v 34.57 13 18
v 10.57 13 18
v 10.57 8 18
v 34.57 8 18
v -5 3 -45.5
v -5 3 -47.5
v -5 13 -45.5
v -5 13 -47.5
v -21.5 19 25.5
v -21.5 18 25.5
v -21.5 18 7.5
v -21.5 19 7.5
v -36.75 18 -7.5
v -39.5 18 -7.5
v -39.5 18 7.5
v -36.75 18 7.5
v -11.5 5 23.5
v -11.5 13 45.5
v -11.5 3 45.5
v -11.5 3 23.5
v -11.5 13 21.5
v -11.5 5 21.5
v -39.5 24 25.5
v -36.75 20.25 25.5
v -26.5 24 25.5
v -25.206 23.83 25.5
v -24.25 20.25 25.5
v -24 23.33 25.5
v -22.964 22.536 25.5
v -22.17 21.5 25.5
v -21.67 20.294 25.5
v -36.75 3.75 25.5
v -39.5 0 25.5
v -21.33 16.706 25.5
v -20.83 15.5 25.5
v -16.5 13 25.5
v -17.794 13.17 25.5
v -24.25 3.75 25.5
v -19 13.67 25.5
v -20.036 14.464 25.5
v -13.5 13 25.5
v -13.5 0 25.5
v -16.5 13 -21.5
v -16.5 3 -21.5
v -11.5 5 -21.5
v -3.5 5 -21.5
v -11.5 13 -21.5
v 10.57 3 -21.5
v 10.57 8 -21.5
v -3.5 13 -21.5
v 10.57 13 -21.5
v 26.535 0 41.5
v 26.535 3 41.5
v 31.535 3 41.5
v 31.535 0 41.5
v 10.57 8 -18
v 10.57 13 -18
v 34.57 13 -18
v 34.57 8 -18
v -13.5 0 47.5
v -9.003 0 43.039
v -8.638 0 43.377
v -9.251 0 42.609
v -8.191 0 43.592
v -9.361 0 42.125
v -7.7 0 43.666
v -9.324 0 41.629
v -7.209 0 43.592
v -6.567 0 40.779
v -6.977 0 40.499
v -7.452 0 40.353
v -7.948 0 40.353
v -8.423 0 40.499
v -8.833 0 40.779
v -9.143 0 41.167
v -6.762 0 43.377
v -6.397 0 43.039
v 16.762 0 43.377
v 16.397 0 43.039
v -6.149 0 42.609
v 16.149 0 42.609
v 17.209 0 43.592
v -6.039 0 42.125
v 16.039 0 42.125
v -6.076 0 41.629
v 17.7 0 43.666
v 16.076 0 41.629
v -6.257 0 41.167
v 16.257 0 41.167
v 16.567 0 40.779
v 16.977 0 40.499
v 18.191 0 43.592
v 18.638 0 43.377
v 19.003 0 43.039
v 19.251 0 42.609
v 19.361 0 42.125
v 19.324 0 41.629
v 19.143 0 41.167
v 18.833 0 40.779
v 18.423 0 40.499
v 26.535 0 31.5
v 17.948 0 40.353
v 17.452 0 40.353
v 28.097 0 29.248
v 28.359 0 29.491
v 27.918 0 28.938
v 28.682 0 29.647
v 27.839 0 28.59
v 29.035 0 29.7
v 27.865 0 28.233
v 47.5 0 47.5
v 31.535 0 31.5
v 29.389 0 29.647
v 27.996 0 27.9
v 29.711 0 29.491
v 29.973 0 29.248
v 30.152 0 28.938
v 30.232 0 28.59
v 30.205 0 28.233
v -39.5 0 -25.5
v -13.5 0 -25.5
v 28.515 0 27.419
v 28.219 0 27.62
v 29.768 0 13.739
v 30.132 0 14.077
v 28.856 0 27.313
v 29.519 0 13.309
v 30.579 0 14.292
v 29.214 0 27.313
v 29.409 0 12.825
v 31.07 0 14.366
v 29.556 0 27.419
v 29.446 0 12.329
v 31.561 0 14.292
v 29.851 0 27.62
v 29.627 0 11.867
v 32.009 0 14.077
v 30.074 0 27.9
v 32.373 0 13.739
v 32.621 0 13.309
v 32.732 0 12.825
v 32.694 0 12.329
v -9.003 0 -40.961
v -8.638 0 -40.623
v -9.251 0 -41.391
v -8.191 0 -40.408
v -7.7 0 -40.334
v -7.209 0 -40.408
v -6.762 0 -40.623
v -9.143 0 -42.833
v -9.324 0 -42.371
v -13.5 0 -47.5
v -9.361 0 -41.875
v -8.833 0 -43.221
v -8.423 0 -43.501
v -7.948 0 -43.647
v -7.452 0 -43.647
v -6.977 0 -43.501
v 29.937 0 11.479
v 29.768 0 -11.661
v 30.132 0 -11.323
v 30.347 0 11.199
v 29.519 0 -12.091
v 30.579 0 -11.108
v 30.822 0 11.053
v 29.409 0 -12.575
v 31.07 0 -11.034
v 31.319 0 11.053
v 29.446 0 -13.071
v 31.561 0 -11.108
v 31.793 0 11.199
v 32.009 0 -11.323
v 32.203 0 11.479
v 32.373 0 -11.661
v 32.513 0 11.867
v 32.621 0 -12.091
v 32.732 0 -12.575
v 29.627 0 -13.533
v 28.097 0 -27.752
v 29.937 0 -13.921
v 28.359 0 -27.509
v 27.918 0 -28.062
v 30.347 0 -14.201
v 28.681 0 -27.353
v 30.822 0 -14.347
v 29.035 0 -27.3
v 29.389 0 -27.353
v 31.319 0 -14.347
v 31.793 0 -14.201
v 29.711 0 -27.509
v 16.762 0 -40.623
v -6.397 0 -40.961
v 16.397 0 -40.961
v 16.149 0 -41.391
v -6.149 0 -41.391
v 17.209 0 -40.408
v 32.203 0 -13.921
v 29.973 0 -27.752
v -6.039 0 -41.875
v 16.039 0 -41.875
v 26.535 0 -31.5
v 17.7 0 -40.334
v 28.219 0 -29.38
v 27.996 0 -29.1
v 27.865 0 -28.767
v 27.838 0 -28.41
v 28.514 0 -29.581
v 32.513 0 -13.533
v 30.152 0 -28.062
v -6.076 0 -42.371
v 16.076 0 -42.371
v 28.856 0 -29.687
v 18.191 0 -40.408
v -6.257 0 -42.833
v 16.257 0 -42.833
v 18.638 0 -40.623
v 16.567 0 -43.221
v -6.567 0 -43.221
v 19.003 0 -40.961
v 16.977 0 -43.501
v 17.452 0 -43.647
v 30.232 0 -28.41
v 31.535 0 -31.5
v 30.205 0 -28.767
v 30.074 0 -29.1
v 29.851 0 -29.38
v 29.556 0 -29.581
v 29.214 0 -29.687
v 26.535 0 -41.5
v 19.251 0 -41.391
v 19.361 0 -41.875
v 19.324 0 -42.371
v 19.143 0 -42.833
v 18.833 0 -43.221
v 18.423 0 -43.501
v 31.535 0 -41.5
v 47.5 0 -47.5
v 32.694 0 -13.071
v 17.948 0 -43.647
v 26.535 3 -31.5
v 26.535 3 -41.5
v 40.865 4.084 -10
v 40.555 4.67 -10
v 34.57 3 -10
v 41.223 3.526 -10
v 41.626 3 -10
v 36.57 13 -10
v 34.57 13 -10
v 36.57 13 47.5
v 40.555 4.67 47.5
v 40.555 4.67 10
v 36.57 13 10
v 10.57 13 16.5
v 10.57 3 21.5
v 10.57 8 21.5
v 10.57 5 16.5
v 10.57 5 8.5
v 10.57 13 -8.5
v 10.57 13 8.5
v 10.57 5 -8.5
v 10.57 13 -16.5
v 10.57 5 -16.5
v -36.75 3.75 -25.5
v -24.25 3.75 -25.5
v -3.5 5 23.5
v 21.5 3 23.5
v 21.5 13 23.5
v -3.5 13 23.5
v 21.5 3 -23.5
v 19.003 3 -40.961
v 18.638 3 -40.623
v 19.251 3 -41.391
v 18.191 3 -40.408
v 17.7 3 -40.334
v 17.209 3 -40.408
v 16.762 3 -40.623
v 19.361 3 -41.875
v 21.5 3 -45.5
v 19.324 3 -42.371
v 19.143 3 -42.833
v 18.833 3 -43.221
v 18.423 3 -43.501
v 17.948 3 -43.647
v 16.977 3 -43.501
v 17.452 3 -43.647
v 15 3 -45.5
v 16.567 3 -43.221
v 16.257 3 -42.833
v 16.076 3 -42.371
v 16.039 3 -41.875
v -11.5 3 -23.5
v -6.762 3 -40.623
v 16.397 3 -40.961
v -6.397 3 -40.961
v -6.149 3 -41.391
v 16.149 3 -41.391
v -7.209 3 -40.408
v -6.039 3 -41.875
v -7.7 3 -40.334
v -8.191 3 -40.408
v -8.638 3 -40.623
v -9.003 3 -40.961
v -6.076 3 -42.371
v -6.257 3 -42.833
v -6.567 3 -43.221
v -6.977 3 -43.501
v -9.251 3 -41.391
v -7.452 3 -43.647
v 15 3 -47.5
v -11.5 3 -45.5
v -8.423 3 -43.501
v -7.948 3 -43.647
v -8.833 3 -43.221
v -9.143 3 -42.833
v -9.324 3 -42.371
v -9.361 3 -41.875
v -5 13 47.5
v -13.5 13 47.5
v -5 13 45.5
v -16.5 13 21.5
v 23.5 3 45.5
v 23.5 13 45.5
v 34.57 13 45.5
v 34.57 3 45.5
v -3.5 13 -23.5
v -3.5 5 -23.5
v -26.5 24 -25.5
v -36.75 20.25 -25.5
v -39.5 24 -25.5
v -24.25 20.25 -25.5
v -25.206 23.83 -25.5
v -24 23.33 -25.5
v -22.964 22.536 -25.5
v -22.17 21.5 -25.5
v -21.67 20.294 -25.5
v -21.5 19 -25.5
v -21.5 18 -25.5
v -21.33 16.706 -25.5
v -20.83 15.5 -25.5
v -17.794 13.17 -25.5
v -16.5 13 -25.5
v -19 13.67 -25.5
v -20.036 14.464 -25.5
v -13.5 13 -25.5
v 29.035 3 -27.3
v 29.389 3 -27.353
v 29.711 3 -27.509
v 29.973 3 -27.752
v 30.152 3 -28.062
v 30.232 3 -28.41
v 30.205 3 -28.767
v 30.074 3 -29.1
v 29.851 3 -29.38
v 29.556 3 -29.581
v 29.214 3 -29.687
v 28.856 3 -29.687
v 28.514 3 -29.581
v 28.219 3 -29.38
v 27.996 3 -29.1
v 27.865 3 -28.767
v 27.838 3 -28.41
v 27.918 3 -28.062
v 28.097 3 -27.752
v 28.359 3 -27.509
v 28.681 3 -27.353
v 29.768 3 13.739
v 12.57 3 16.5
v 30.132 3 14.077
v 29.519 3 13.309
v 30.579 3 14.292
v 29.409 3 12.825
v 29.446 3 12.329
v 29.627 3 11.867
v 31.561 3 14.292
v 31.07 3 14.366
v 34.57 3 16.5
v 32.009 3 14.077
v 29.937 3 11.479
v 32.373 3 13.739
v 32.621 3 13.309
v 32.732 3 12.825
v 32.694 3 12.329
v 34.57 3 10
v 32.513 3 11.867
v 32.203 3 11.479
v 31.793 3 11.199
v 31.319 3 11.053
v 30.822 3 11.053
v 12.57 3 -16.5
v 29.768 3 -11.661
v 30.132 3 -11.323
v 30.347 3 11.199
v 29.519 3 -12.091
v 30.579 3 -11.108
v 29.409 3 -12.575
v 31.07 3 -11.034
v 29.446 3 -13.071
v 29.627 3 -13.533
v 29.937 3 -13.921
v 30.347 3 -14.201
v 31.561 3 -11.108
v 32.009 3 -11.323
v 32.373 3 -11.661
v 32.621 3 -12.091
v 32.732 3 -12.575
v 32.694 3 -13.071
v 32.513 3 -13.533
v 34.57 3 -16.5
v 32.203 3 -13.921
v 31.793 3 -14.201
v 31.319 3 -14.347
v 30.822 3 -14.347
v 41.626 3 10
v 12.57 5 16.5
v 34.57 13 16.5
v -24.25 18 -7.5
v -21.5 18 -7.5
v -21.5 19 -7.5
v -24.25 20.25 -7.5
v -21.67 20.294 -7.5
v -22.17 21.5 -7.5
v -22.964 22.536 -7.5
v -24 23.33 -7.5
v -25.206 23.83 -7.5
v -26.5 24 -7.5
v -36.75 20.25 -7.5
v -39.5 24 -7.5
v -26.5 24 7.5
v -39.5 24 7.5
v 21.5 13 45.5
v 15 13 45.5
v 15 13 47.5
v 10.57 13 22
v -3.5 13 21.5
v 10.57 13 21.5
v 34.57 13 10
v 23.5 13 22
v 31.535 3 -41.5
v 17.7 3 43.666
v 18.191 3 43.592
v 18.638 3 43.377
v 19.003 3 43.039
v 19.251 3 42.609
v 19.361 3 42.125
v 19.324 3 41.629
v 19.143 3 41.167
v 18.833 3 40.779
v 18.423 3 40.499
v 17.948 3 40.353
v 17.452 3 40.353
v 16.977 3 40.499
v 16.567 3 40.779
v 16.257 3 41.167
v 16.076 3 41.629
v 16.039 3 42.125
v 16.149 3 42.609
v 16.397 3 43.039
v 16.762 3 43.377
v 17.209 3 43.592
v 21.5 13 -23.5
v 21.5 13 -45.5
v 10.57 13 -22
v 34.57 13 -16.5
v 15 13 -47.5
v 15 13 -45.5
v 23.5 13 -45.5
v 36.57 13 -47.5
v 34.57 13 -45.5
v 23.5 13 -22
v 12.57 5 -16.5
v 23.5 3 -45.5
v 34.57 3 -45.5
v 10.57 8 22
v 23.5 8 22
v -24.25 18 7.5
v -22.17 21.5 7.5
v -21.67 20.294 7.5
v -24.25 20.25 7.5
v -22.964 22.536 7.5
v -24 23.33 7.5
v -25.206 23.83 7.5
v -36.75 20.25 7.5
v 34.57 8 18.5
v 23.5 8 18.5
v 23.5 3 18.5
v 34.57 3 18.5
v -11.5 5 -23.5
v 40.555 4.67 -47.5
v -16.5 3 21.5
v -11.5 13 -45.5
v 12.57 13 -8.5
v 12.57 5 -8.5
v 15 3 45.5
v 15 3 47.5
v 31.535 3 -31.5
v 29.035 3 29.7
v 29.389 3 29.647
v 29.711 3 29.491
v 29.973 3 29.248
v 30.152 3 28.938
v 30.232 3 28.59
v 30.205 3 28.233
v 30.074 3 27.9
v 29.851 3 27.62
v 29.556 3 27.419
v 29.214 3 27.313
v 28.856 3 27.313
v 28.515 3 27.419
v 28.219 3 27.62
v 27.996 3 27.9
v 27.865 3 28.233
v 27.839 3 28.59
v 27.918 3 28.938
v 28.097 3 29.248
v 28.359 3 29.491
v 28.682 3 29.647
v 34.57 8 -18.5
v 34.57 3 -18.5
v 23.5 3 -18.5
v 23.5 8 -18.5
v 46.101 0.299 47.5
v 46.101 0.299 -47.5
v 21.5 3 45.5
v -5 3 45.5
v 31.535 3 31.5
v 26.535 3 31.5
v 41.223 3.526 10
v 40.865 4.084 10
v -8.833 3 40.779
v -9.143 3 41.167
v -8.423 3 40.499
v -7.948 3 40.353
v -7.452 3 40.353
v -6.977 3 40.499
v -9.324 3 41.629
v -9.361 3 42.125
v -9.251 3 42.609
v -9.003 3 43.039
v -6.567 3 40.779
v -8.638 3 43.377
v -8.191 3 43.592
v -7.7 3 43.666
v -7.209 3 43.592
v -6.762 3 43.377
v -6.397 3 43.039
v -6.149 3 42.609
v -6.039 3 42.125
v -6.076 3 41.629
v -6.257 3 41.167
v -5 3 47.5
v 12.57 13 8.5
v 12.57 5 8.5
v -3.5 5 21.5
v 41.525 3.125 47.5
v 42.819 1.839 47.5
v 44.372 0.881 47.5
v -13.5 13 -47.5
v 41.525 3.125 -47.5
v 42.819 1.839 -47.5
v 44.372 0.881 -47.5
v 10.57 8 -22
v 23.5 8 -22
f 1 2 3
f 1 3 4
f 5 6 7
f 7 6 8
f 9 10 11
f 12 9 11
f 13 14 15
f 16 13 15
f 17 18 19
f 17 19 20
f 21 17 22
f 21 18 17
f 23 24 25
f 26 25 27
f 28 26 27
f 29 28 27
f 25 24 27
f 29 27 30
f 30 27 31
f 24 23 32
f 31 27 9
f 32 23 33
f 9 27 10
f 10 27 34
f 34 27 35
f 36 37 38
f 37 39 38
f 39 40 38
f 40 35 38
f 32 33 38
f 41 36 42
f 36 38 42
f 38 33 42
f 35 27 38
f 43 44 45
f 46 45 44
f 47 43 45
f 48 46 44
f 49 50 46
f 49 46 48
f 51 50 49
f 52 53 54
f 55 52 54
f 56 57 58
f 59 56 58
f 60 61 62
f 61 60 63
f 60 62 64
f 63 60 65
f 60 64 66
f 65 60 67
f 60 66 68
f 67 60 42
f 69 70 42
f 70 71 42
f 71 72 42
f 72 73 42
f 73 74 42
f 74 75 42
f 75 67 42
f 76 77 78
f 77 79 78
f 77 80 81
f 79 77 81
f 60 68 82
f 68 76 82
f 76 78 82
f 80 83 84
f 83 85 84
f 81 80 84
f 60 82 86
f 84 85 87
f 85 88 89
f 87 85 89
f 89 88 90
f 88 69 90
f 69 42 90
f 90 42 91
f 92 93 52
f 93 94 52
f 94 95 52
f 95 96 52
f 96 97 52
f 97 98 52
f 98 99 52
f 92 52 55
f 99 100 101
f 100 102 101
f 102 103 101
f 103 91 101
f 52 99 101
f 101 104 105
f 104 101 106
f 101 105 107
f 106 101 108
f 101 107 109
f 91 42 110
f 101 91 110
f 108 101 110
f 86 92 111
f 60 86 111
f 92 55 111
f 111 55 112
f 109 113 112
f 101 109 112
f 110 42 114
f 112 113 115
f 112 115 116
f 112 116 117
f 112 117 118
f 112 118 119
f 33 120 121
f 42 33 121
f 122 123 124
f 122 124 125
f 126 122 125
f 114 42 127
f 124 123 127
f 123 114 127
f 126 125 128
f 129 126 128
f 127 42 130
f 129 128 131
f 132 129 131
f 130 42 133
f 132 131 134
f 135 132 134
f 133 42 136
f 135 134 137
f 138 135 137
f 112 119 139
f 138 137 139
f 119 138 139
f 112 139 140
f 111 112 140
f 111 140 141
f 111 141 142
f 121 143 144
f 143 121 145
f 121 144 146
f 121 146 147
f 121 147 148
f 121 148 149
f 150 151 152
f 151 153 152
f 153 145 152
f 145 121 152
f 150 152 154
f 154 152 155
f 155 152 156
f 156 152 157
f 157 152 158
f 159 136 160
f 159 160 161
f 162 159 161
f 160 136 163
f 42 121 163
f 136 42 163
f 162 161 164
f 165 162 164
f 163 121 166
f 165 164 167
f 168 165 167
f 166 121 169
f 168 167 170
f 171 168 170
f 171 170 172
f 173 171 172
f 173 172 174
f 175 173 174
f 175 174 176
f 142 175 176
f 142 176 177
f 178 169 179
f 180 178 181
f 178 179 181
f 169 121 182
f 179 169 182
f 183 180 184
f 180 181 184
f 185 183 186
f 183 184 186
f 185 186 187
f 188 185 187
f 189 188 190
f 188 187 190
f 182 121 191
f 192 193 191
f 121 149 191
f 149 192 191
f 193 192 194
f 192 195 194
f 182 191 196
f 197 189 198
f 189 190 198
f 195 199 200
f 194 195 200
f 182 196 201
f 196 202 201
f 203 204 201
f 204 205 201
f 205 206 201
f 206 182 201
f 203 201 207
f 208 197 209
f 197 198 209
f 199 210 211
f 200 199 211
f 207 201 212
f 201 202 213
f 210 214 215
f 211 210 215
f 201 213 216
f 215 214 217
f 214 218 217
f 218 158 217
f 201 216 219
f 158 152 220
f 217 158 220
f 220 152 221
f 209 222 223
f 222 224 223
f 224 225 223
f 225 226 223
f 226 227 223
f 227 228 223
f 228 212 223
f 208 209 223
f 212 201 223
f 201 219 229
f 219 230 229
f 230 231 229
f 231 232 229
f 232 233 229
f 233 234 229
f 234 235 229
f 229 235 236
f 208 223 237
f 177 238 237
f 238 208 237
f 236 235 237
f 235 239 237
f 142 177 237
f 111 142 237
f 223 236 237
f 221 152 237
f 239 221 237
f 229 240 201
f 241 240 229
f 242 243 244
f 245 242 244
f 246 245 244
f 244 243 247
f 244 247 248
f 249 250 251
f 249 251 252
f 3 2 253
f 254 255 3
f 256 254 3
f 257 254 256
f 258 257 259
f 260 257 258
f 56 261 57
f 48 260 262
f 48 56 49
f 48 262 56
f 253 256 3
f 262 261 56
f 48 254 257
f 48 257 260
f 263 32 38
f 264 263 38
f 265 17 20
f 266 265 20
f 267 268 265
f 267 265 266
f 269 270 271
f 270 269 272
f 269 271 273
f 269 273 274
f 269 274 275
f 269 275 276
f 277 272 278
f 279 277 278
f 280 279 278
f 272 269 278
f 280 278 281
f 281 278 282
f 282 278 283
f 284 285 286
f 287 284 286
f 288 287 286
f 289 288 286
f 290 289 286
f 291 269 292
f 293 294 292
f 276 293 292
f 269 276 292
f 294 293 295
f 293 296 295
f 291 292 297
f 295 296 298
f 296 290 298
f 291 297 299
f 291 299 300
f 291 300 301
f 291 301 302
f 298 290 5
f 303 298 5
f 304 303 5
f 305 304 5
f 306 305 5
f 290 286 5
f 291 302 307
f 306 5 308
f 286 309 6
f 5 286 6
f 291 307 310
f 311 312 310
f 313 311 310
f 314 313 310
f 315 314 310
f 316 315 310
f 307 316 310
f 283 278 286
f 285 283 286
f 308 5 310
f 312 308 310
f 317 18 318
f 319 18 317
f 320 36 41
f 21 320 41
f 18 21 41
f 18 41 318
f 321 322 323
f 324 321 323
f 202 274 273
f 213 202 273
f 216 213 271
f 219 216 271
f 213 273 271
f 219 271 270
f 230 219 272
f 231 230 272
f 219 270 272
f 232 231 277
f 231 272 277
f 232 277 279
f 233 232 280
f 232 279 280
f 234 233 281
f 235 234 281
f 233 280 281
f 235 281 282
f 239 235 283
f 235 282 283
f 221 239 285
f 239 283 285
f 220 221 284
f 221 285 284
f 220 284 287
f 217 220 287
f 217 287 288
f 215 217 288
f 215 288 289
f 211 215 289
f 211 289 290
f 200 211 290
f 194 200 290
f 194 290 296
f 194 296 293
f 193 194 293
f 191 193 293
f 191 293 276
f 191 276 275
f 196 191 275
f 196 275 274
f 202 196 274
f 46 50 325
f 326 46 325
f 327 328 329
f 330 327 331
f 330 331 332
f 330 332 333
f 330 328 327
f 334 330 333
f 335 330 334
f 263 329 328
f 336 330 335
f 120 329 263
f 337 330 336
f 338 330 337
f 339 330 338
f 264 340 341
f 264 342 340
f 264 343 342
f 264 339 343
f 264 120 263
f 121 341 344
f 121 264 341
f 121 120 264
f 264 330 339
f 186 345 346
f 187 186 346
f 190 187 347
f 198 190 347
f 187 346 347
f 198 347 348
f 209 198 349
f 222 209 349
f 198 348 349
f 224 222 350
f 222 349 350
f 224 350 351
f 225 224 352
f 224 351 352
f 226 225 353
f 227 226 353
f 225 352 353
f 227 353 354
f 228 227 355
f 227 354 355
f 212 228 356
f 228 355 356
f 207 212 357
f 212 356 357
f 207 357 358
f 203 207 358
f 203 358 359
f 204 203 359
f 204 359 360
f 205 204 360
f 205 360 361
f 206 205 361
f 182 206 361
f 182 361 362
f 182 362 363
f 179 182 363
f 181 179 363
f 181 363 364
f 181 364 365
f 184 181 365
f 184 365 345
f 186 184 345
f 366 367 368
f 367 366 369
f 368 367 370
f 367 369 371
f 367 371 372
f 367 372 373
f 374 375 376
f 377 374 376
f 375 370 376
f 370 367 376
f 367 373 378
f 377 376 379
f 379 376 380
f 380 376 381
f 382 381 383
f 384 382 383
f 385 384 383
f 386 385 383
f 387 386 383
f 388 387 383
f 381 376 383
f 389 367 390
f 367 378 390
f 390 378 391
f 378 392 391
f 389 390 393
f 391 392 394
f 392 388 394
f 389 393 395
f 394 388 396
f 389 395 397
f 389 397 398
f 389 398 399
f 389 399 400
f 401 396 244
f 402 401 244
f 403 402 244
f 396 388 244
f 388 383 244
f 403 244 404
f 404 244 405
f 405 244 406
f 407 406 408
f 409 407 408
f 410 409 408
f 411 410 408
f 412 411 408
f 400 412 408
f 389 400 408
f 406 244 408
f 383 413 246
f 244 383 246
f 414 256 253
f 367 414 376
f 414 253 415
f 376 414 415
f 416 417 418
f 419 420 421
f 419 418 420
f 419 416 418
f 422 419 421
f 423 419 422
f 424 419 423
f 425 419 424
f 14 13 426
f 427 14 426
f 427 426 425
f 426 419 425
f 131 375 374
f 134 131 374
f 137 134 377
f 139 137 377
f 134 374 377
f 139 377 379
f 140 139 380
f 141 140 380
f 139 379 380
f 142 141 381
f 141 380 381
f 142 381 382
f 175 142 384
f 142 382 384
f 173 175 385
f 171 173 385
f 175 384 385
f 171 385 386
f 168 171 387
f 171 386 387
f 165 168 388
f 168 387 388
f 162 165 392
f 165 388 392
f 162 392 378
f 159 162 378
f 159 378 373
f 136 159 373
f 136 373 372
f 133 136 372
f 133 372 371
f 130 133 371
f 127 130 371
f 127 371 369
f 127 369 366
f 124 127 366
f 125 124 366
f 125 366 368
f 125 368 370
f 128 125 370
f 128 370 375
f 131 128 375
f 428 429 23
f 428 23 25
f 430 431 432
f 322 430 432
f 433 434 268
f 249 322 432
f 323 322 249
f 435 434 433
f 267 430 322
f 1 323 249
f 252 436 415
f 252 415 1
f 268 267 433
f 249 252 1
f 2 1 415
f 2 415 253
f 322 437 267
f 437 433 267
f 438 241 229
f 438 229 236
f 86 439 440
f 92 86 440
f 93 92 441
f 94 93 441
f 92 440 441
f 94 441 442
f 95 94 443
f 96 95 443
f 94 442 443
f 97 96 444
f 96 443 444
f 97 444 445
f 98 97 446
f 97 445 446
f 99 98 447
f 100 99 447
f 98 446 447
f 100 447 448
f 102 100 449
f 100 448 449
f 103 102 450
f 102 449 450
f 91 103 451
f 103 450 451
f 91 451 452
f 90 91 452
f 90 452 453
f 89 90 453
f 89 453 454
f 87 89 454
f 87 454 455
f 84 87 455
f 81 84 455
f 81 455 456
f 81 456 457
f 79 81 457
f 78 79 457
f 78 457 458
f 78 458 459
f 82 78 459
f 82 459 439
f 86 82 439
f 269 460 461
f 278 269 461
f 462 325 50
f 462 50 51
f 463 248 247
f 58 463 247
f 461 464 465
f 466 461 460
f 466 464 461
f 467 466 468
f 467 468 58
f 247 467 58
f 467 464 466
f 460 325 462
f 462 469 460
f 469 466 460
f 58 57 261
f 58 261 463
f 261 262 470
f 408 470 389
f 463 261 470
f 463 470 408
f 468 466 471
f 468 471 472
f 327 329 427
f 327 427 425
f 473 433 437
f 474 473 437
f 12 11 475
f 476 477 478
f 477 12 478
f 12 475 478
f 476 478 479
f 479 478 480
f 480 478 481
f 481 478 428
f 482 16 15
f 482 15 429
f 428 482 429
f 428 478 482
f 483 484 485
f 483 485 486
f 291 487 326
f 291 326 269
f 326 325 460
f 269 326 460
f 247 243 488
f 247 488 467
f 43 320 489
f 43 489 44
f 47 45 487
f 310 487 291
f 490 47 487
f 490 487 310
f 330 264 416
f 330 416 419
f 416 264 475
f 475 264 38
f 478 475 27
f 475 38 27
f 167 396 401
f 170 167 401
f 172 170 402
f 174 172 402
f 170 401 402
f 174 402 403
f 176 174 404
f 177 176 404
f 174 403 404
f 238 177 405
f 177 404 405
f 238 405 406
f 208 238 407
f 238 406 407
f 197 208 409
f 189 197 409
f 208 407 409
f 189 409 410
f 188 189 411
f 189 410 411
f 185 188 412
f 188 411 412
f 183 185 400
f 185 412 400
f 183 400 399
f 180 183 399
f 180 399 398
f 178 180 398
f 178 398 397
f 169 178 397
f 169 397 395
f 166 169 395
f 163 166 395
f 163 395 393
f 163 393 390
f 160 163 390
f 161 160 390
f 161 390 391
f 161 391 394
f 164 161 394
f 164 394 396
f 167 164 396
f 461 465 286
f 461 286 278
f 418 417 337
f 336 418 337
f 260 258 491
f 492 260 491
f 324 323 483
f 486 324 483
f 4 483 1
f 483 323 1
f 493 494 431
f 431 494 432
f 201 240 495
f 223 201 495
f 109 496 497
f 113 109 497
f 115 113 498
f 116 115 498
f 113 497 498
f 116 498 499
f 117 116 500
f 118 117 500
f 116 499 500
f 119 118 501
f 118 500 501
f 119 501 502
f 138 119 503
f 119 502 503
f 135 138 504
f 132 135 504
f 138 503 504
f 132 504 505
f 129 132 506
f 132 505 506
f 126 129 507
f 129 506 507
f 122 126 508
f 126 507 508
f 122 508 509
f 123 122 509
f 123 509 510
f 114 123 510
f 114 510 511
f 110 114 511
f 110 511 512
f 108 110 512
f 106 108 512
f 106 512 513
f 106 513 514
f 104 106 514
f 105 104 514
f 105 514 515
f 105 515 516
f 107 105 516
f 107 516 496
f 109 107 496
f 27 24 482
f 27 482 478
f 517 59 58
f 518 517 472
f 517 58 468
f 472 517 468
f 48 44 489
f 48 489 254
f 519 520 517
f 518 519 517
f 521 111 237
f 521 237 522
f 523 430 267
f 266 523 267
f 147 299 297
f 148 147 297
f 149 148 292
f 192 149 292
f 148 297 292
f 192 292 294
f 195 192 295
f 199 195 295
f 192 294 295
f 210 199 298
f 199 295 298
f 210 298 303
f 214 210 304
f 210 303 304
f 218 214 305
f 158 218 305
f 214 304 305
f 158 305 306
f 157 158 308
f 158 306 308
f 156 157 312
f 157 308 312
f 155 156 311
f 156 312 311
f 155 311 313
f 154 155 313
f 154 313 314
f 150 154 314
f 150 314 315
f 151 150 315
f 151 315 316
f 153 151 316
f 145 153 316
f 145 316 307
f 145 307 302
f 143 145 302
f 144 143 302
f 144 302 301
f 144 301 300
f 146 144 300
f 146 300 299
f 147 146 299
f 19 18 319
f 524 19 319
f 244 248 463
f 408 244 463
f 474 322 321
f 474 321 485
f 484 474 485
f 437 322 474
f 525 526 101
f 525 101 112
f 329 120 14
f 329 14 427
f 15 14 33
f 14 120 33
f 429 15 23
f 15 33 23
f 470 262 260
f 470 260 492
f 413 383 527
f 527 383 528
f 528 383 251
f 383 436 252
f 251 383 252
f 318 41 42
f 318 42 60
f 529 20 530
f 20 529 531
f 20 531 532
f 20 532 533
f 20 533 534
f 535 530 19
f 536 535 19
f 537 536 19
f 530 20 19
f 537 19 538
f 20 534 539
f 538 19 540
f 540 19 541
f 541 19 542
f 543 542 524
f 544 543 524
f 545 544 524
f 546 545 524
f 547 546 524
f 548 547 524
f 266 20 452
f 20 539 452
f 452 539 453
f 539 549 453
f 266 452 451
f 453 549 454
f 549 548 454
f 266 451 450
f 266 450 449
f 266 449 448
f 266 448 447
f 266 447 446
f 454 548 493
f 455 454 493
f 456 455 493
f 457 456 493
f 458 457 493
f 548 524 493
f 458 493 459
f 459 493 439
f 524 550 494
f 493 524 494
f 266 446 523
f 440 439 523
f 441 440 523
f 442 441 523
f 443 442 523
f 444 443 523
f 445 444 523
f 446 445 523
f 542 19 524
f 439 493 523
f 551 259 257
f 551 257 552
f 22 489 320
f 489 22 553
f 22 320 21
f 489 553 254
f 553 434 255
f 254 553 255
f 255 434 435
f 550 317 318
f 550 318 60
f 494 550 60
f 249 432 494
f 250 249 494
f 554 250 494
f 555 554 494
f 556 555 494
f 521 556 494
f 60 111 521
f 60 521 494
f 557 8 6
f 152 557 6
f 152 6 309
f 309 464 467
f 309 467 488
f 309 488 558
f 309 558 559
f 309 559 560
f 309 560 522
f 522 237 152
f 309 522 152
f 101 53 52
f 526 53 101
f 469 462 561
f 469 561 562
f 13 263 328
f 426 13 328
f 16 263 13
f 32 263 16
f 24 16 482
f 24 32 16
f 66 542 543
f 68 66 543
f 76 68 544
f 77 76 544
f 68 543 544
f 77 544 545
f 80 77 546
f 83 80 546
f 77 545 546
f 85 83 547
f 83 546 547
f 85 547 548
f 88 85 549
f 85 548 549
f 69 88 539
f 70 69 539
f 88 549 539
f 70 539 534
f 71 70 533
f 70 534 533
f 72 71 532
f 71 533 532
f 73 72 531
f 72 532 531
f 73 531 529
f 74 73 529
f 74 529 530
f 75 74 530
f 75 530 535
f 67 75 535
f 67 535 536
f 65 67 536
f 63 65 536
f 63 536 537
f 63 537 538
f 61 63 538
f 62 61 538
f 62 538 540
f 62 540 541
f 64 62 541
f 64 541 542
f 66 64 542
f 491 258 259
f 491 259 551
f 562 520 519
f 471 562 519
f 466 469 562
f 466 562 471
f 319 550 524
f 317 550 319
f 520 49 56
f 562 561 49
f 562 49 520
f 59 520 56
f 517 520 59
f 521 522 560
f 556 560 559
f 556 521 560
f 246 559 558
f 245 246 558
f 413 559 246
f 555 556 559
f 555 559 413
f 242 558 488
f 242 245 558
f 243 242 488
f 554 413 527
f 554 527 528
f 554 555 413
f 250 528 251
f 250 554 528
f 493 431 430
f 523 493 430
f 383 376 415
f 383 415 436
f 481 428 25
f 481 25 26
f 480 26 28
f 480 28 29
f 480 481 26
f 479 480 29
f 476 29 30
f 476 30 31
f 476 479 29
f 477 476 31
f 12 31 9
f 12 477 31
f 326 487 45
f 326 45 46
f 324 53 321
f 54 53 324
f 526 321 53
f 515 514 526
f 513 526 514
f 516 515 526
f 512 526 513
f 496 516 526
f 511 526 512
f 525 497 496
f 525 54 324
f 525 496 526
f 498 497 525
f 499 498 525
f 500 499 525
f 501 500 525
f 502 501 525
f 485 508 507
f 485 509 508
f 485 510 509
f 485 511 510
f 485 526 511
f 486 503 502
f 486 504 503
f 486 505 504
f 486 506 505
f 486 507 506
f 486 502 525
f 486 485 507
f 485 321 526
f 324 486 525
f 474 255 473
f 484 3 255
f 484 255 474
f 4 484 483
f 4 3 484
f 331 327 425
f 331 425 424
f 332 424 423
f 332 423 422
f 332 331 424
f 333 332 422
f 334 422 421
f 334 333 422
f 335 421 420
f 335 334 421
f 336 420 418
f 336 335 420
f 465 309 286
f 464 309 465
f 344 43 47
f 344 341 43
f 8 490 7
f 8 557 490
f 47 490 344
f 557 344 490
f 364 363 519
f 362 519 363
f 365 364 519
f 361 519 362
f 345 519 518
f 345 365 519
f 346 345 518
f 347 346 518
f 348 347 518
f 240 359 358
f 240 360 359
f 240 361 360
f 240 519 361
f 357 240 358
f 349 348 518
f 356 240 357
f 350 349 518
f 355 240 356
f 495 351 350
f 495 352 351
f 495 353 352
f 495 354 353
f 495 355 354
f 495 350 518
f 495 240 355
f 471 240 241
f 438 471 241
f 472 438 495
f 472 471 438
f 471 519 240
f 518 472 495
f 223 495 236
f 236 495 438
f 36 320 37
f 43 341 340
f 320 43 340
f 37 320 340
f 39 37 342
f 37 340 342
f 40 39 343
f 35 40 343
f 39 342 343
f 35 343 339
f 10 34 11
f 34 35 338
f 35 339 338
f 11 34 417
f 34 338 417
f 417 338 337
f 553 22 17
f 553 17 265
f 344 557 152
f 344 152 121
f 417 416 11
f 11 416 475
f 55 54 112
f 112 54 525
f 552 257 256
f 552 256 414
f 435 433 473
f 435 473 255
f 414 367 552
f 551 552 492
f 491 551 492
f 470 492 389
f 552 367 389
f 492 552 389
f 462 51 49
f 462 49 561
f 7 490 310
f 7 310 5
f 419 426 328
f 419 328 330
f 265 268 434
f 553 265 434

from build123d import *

# Parameters (mm, degrees)
SKETCH1_W           = 95
SKETCH1_H           = 95
BOSS_EXTRUDE2_DEPTH = 13
SKETCH2_W           = 22
SKETCH2_H           = 13
CUT_EXTRUDE1_DEPTH  = 34
SKETCH3_W           = 22
SKETCH3_H           = 13
CUT_EXTRUDE2_DEPTH  = 34
SKETCH5_W           = 26
SKETCH5_H           = 51
BOSS_EXTRUDE3_DEPTH = 20
SKETCH6_W           = 12
SKETCH6_H           = 16
CUT_EXTRUDE4_DEPTH  = 200
SKETCH7_W           = 26
SKETCH7_H           = 9
CUT_EXTRUDE5_DEPTH  = 200
FILLET2_R           = 5
SKETCH8_W           = 8
SKETCH8_H           = 24
CUT_EXTRUDE6_DEPTH  = 200
SKETCH9_W           = 33
SKETCH9_H           = 22
CUT_EXTRUDE7_DEPTH  = 10
SKETCH10_W          = 20
SKETCH10_H          = 10
CUT_EXTRUDE10_DEPTH = 10
SKETCH13_W          = 33
SKETCH13_H          = 22
CUT_EXTRUDE11_DEPTH = 10
SKETCH14_W          = 20
SKETCH14_H          = 10
CUT_EXTRUDE12_DEPTH = 10
SKETCH18_W          = 20
SKETCH18_H          = 10
CUT_EXTRUDE16_DEPTH = 50
CUT_EXTRUDE17_DEPTH = 100000
SKETCH20_W          = 22
SKETCH20_H          = 33
CUT_EXTRUDE18_DEPTH = 10
SKETCH21_W          = 27.070242808
SKETCH21_H          = 43
CUT_EXTRUDE19_DEPTH = 10
SKETCH22_W          = 2
SKETCH22_H          = 20
BOSS_EXTRUDE4_DEPTH = 10
SKETCH23_W          = 12.5
SKETCH23_H          = 16.5
CUT_EXTRUDE20_DEPTH = 200
SKETCH24_W          = 8
SKETCH24_H          = 2
CUT_EXTRUDE21_DEPTH = 8
SKETCH25_W          = 8
SKETCH25_H          = 2
CUT_EXTRUDE22_DEPTH = 8
SKETCH26_W          = 2
SKETCH26_H          = 8
CUT_EXTRUDE24_DEPTH = 8
SKETCH27_W          = 2
SKETCH27_H          = 8
CUT_EXTRUDE25_DEPTH = 8
SKETCH28_W          = 11.070242808
SKETCH28_H          = 27
CUT_EXTRUDE26_DEPTH = 10
SKETCH29_W          = 11.070242808
SKETCH29_H          = 27
CUT_EXTRUDE27_DEPTH = 10
SKETCH30_W          = 24
SKETCH30_H          = 4
CUT_EXTRUDE29_DEPTH = 5
SKETCH31_W          = 24
SKETCH31_H          = 4
CUT_EXTRUDE30_DEPTH = 5
SKETCH32_W          = 5
SKETCH32_H          = 5
CUT_EXTRUDE32_DEPTH = 5
SKETCH40_W          = 5
SKETCH40_H          = 10
CUT_EXTRUDE39_DEPTH = 5
SKETCH41_R          = 1.2
CUT_EXTRUDE40_DEPTH = 5
SKETCH42_W          = 5
SKETCH42_H          = 5
CUT_EXTRUDE41_DEPTH = 5
SKETCH43_R          = 1.2
CUT_EXTRUDE42_DEPTH = 5
SKETCH44_R          = 1.666
CUT_EXTRUDE43_DEPTH = 5
SKETCH45_R          = 1.666
CUT_EXTRUDE44_DEPTH = 5
SKETCH46_R          = 1.666
CUT_EXTRUDE45_DEPTH = 5
FILLET6_R           = 8
SKETCH47_W          = 15
SKETCH47_H          = 6
CUT_EXTRUDE46_DEPTH = 100


with BuildPart() as part:
    # Sketch1 → Boss-Extrude2 (new body)
    with BuildSketch(Plane(origin=(0, 0, 0), x_dir=(1, 0, 0), z_dir=(0, 1, 0))):
        Rectangle(SKETCH1_W, SKETCH1_H)
    extrude(amount=BOSS_EXTRUDE2_DEPTH)

    # Sketch2 → Cut-Extrude1 (cut)
    with BuildSketch(Plane.ZY.offset(47.5)):
        with Locations((36.5, 6.5)):
            Rectangle(SKETCH2_W, SKETCH2_H)
    extrude(amount=-CUT_EXTRUDE1_DEPTH, mode=Mode.SUBTRACT)

    # Sketch3 → Cut-Extrude2 (cut)
    with BuildSketch(Plane.ZY.offset(47.5)):
        with Locations((-36.5, 6.5)):
            Rectangle(SKETCH3_W, SKETCH3_H)
    extrude(amount=-CUT_EXTRUDE2_DEPTH, mode=Mode.SUBTRACT)

    # Sketch5 → Boss-Extrude3 (add)
    with BuildSketch(Plane(origin=(0, 13, 0), x_dir=(1, 0, 0), z_dir=(0, 1, 0))):
        with Locations((-34.5, 0)):
            Rectangle(SKETCH5_W, SKETCH5_H)
    extrude(amount=BOSS_EXTRUDE3_DEPTH)

    # Sketch6 → Cut-Extrude4 (cut)
    with BuildSketch(Plane.XY.offset(25.5)):
        with Locations((-30.5, 12)):
            Rectangle(SKETCH6_W, SKETCH6_H)
    extrude(amount=-CUT_EXTRUDE4_DEPTH, mode=Mode.SUBTRACT)

    # Sketch7 → Cut-Extrude5 (cut)
    with BuildSketch(Plane.XY.offset(25.5)):
        with Locations((-34.5, 28.5)):
            Rectangle(SKETCH7_W, SKETCH7_H)
    extrude(amount=-CUT_EXTRUDE5_DEPTH, mode=Mode.SUBTRACT)

    # Fillet2
    fillet2_edges = [part.edges().sort_by_distance(p)[0] for p in [
        (-21.5, 24, 0),
        (-21.5, 13, 0),
    ]]
    fillet(fillet2_edges, radius=FILLET2_R)

    # Sketch8 → Cut-Extrude6 (cut)
    with BuildSketch(Plane.XY.offset(25.5)):
        with Locations((-43.5, 12)):
            Rectangle(SKETCH8_W, SKETCH8_H)
    extrude(amount=-CUT_EXTRUDE6_DEPTH, mode=Mode.SUBTRACT)

    # Sketch9 → Cut-Extrude7 (cut)
    with BuildSketch(Plane(origin=(0, 13, 0), x_dir=(1, 0, 0), z_dir=(0, 1, 0))):
        with Locations((5, -34.5)):
            Rectangle(SKETCH9_W, SKETCH9_H)
    extrude(amount=-CUT_EXTRUDE7_DEPTH, mode=Mode.SUBTRACT)

    # Sketch10 → Cut-Extrude10 (cut)
    with BuildSketch(Plane.XY.offset(47.5)):
        with Locations((5, 8)):
            Rectangle(SKETCH10_W, SKETCH10_H)
    extrude(amount=-CUT_EXTRUDE10_DEPTH, mode=Mode.SUBTRACT)

    # Sketch13 → Cut-Extrude11 (cut)
    with BuildSketch(Plane(origin=(0, 13, 0), x_dir=(1, 0, 0), z_dir=(0, 1, 0))):
        with Locations((5, 34.5)):
            Rectangle(SKETCH13_W, SKETCH13_H)
    extrude(amount=-CUT_EXTRUDE11_DEPTH, mode=Mode.SUBTRACT)

    # Sketch14 → Cut-Extrude12 (cut)
    with BuildSketch(Plane(origin=(0, 0, -47.5), x_dir=(-1, 0, 0), z_dir=(0, 0, -1))):
        with Locations((-5, 8)):
            Rectangle(SKETCH14_W, SKETCH14_H)
    extrude(amount=-CUT_EXTRUDE12_DEPTH, mode=Mode.SUBTRACT)

    # Sketch18 → Cut-Extrude16 (cut)
    with BuildSketch(Plane(origin=(47.5, 0, 0), x_dir=(0, 0, -1), z_dir=(1, 0, 0))):
        with Locations((0, 8)):
            Rectangle(SKETCH18_W, SKETCH18_H)
    extrude(amount=-CUT_EXTRUDE16_DEPTH, mode=Mode.SUBTRACT)

    # Sketch19 → Cut-Extrude17 (cut)
    with BuildSketch(Plane.XY.offset(47.5)):
        Polygon((47.5, 0), (42.252710702, 1.120152934), (36.570242808, 13), (47.5, 13), align=None)
    extrude(amount=-CUT_EXTRUDE17_DEPTH, mode=Mode.SUBTRACT)

    # Sketch20 → Cut-Extrude18 (cut)
    with BuildSketch(Plane(origin=(0, 13, 0), x_dir=(1, 0, 0), z_dir=(0, 1, 0))):
        with Locations((23.570242808, 0)):
            Rectangle(SKETCH20_W, SKETCH20_H)
    extrude(amount=-CUT_EXTRUDE18_DEPTH, mode=Mode.SUBTRACT)

    # Sketch21 → Cut-Extrude19 (cut)
    with BuildSketch(Plane(origin=(0, 13, 0), x_dir=(1, 0, 0), z_dir=(0, 1, 0))):
        with Locations((-2.964878596, 0)):
            Rectangle(SKETCH21_W, SKETCH21_H)
    extrude(amount=-CUT_EXTRUDE19_DEPTH, mode=Mode.SUBTRACT)

    # Sketch22 → Boss-Extrude4 (add)
    with BuildSketch(Plane(origin=(0, 3, 0), x_dir=(1, 0, 0), z_dir=(0, 1, 0))):
        with Locations((11.570242808, 0)):
            Rectangle(SKETCH22_W, SKETCH22_H)
    extrude(amount=BOSS_EXTRUDE4_DEPTH)

    # Sketch23 → Cut-Extrude20 (cut)
    with BuildSketch(Plane.XY.offset(25.5)):
        with Locations((-30.5, 12)):
            Rectangle(SKETCH23_W, SKETCH23_H)
    extrude(amount=-CUT_EXTRUDE20_DEPTH, mode=Mode.SUBTRACT)

    # Sketch24 → Cut-Extrude21 (cut)
    with BuildSketch(Plane(origin=(0, 13, 0), x_dir=(1, 0, 0), z_dir=(0, 1, 0))):
        with Locations((-7.5, -22.5)):
            Rectangle(SKETCH24_W, SKETCH24_H)
    extrude(amount=-CUT_EXTRUDE21_DEPTH, mode=Mode.SUBTRACT)

    # Sketch25 → Cut-Extrude22 (cut)
    with BuildSketch(Plane(origin=(0, 13, 0), x_dir=(1, 0, 0), z_dir=(0, 1, 0))):
        with Locations((-7.5, 22.5)):
            Rectangle(SKETCH25_W, SKETCH25_H)
    extrude(amount=-CUT_EXTRUDE22_DEPTH, mode=Mode.SUBTRACT)

    # Sketch26 → Cut-Extrude24 (cut)
    with BuildSketch(Plane(origin=(0, 13, 0), x_dir=(1, 0, 0), z_dir=(0, 1, 0))):
        with Locations((11.570242808, -12.5)):
            Rectangle(SKETCH26_W, SKETCH26_H)
    extrude(amount=-CUT_EXTRUDE24_DEPTH, mode=Mode.SUBTRACT)

    # Sketch27 → Cut-Extrude25 (cut)
    with BuildSketch(Plane(origin=(0, 13, 0), x_dir=(1, 0, 0), z_dir=(0, 1, 0))):
        with Locations((11.570242808, 12.5)):
            Rectangle(SKETCH27_W, SKETCH27_H)
    extrude(amount=-CUT_EXTRUDE25_DEPTH, mode=Mode.SUBTRACT)

    # Sketch28 → Cut-Extrude26 (cut)
    with BuildSketch(Plane(origin=(0, 13, 0), x_dir=(1, 0, 0), z_dir=(0, 1, 0))):
        with Locations((29.035121404, -32)):
            Rectangle(SKETCH28_W, SKETCH28_H)
    extrude(amount=-CUT_EXTRUDE26_DEPTH, mode=Mode.SUBTRACT)

    # Sketch29 → Cut-Extrude27 (cut)
    with BuildSketch(Plane(origin=(0, 13, 0), x_dir=(1, 0, 0), z_dir=(0, 1, 0))):
        with Locations((29.035121404, 32)):
            Rectangle(SKETCH29_W, SKETCH29_H)
    extrude(amount=-CUT_EXTRUDE27_DEPTH, mode=Mode.SUBTRACT)

    # Sketch30 → Cut-Extrude29 (cut)
    with BuildSketch(Plane(origin=(0, 13, 0), x_dir=(1, 0, 0), z_dir=(0, 1, 0))):
        with Locations((22.570242808, -20)):
            Rectangle(SKETCH30_W, SKETCH30_H)
    extrude(amount=-CUT_EXTRUDE29_DEPTH, mode=Mode.SUBTRACT)

    # Sketch31 → Cut-Extrude30 (cut)
    with BuildSketch(Plane(origin=(0, 13, 0), x_dir=(1, 0, 0), z_dir=(0, 1, 0))):
        with Locations((22.570242808, 20)):
            Rectangle(SKETCH31_W, SKETCH31_H)
    extrude(amount=-CUT_EXTRUDE30_DEPTH, mode=Mode.SUBTRACT)

    # Sketch32 → Cut-Extrude32 (cut)
    with BuildSketch(Plane(origin=(0, 3, 0), x_dir=(1, 0, 0), z_dir=(0, 1, 0))):
        with Locations((29.035242808, -39)):
            Rectangle(SKETCH32_W, SKETCH32_H)
    extrude(amount=-CUT_EXTRUDE32_DEPTH, mode=Mode.SUBTRACT)

    # Sketch40 → Cut-Extrude39 (cut)
    with BuildSketch(Plane(origin=(0, 3, 0), x_dir=(1, 0, 0), z_dir=(0, 1, 0))):
        with Locations((29.035, 36.5)):
            Rectangle(SKETCH40_W, SKETCH40_H)
    extrude(amount=-CUT_EXTRUDE39_DEPTH, mode=Mode.SUBTRACT)

    # Sketch41 → Cut-Extrude40 (cut)
    with BuildSketch(Plane(origin=(0, 3, 0), x_dir=(1, 0, 0), z_dir=(0, 1, 0))):
        with Locations(Location((29.035, 28.5, 0), (0, 0, 270))):
            Circle(SKETCH41_R)
    extrude(amount=-CUT_EXTRUDE40_DEPTH, mode=Mode.SUBTRACT)

    # Sketch42 → Cut-Extrude41 (cut)
    with BuildSketch(Plane(origin=(0, 3, 0), x_dir=(1, 0, 0), z_dir=(0, 1, 0))):
        with Locations((29.035242808, -34)):
            Rectangle(SKETCH42_W, SKETCH42_H)
    extrude(amount=-CUT_EXTRUDE41_DEPTH, mode=Mode.SUBTRACT)

    # Sketch43 → Cut-Extrude42 (cut)
    with BuildSketch(Plane(origin=(0, 3, 0), x_dir=(1, 0, 0), z_dir=(0, 1, 0))):
        with Locations(Location((29.035242808, -28.5, 0), (0, 0, 270))):
            Circle(SKETCH43_R)
    extrude(amount=-CUT_EXTRUDE42_DEPTH, mode=Mode.SUBTRACT)

    # Sketch44 → Cut-Extrude43 (cut)
    with BuildSketch(Plane(origin=(0, 3, 0), x_dir=(1, 0, 0), z_dir=(0, 1, 0))):
        with Locations(Location((-7.7, 42, 0), (0, 0, 270))):
            Circle(SKETCH44_R)
        with Locations(Location((17.7, 42, 0), (0, 0, 270))):
            Circle(SKETCH44_R)
    extrude(amount=-CUT_EXTRUDE43_DEPTH, mode=Mode.SUBTRACT)

    # Sketch45 → Cut-Extrude44 (cut)
    with BuildSketch(Plane(origin=(0, 3, 0), x_dir=(1, 0, 0), z_dir=(0, 1, 0))):
        with Locations(Location((-7.7, -42, 0), (0, 0, 270))):
            Circle(SKETCH45_R)
        with Locations(Location((17.7, -42, 0), (0, 0, 270))):
            Circle(SKETCH45_R)
    extrude(amount=-CUT_EXTRUDE44_DEPTH, mode=Mode.SUBTRACT)

    # Sketch46 → Cut-Extrude45 (cut)
    with BuildSketch(Plane(origin=(0, 3, 0), x_dir=(1, 0, 0), z_dir=(0, 1, 0))):
        with Locations(Location((31.070242808, -12.7, 0), (0, 0, 270))):
            Circle(SKETCH46_R)
        with Locations(Location((31.070242808, 12.7, 0), (0, 0, 270))):
            Circle(SKETCH46_R)
    extrude(amount=-CUT_EXTRUDE45_DEPTH, mode=Mode.SUBTRACT)

    # Fillet6
    # the kernel refuses this fillet: 8 mm, written as the material it adds along each edge
    with BuildSketch(Plane(origin=(42.252710702, 1.120152934, 47.5), x_dir=(-0.4315050547709999, 0.902110518565811, 0), z_dir=(0, 0, -1))) as fillet6_piece_1_section:
        with BuildLine():
            CenterArc((FILLET6_R * 0.491916580905, FILLET6_R), FILLET6_R, 217.613324298, 52.386675702)
            Line((-FILLET6_R * 0.300231150017, FILLET6_R * 0.389670603367), (0, 0))
            Line((0, 0), (FILLET6_R * 0.491916580905, 0))
        make_face()
    fillet6_piece_1 = extrude(amount=95, mode=Mode.PRIVATE)
    fillet6_piece_1 = split(fillet6_piece_1, bisect_by=Plane(origin=(40.996343353, 3.680803438, 10), z_dir=(0, 0, 1)), keep=Keep.TOP, mode=Mode.PRIVATE)
    fillet6_piece_1 = split(fillet6_piece_1, bisect_by=Plane(origin=(40.996343353, 3, 28.75), z_dir=(0, 1, 0)), keep=Keep.TOP, mode=Mode.PRIVATE)
    add(fillet6_piece_1)
    with BuildSketch(Plane(origin=(42.252710702, 1.120152934, 47.5), x_dir=(-0.4315050547709999, 0.902110518565811, 0), z_dir=(0, 0, -1))) as fillet6_piece_2_section:
        with BuildLine():
            CenterArc((FILLET6_R * 0.491916580905, FILLET6_R), FILLET6_R, 217.613324298, 52.386675702)
            Line((-FILLET6_R * 0.300231150017, FILLET6_R * 0.389670603367), (0, 0))
            Line((0, 0), (FILLET6_R * 0.491916580905, 0))
        make_face()
    fillet6_piece_2 = extrude(amount=95, mode=Mode.PRIVATE)
    fillet6_piece_2 = split(fillet6_piece_2, bisect_by=Plane(origin=(42.958701315, 1.423679354, 10), z_dir=(0, 0, 1)), keep=Keep.TOP, mode=Mode.PRIVATE)
    fillet6_piece_2 = split(fillet6_piece_2, bisect_by=Plane(origin=(42.958701315, 3, 28.75), z_dir=(0, -1, 0)), keep=Keep.TOP, mode=Mode.PRIVATE)
    add(fillet6_piece_2)
    with BuildSketch(Plane(origin=(42.252710702, 1.120152934, 47.5), x_dir=(-0.4315050547709999, 0.902110518565811, 0), z_dir=(0, 0, -1))) as fillet6_piece_3_section:
        with BuildLine():
            CenterArc((FILLET6_R * 0.491916580905, FILLET6_R), FILLET6_R, 217.613324298, 52.386675702)
            Line((-FILLET6_R * 0.300231150017, FILLET6_R * 0.389670603367), (0, 0))
            Line((0, 0), (FILLET6_R * 0.491916580905, 0))
        make_face()
    fillet6_piece_3 = extrude(amount=95, mode=Mode.PRIVATE)
    fillet6_piece_3 = split(fillet6_piece_3, bisect_by=Plane(origin=(42.958701315, 1.423679354, 10), z_dir=(0, 0, -1)), keep=Keep.TOP, mode=Mode.PRIVATE)
    fillet6_piece_3 = split(fillet6_piece_3, bisect_by=Plane(origin=(42.958701315, 3, 0), z_dir=(0, -1, 0)), keep=Keep.TOP, mode=Mode.PRIVATE)
    fillet6_piece_3 = split(fillet6_piece_3, bisect_by=Plane(origin=(42.958701315, 1.423679354, -10), z_dir=(0, 0, 1)), keep=Keep.TOP, mode=Mode.PRIVATE)
    add(fillet6_piece_3)
    with BuildSketch(Plane(origin=(42.252710702, 1.120152934, 47.5), x_dir=(-0.4315050547709999, 0.902110518565811, 0), z_dir=(0, 0, -1))) as fillet6_piece_4_section:
        with BuildLine():
            CenterArc((FILLET6_R * 0.491916580905, FILLET6_R), FILLET6_R, 217.613324298, 52.386675702)
            Line((-FILLET6_R * 0.300231150017, FILLET6_R * 0.389670603367), (0, 0))
            Line((0, 0), (FILLET6_R * 0.491916580905, 0))
        make_face()
    fillet6_piece_4 = extrude(amount=95, mode=Mode.PRIVATE)
    fillet6_piece_4 = split(fillet6_piece_4, bisect_by=Plane(origin=(40.996343353, 3, -28.75), z_dir=(0, 1, 0)), keep=Keep.TOP, mode=Mode.PRIVATE)
    fillet6_piece_4 = split(fillet6_piece_4, bisect_by=Plane(origin=(40.996343353, 3.680803438, -10), z_dir=(0, 0, -1)), keep=Keep.TOP, mode=Mode.PRIVATE)
    add(fillet6_piece_4)
    with BuildSketch(Plane(origin=(42.252710702, 1.120152934, 47.5), x_dir=(-0.4315050547709999, 0.902110518565811, 0), z_dir=(0, 0, -1))) as fillet6_piece_5_section:
        with BuildLine():
            CenterArc((FILLET6_R * 0.491916580905, FILLET6_R), FILLET6_R, 217.613324298, 52.386675702)
            Line((-FILLET6_R * 0.300231150017, FILLET6_R * 0.389670603367), (0, 0))
            Line((0, 0), (FILLET6_R * 0.491916580905, 0))
        make_face()
    fillet6_piece_5 = extrude(amount=95, mode=Mode.PRIVATE)
    fillet6_piece_5 = split(fillet6_piece_5, bisect_by=Plane(origin=(42.958701315, 3, -28.75), z_dir=(0, -1, 0)), keep=Keep.TOP, mode=Mode.PRIVATE)
    fillet6_piece_5 = split(fillet6_piece_5, bisect_by=Plane(origin=(42.958701315, 1.423679354, -10), z_dir=(0, 0, -1)), keep=Keep.TOP, mode=Mode.PRIVATE)
    add(fillet6_piece_5)

    # Sketch47 → Cut-Extrude46 (cut)
    with BuildSketch(Plane.ZY.offset(39.5)):
        with Locations((0, 21)):
            Rectangle(SKETCH47_W, SKETCH47_H)
    extrude(amount=-CUT_EXTRUDE46_DEPTH, mode=Mode.SUBTRACT)


solid = part.part
